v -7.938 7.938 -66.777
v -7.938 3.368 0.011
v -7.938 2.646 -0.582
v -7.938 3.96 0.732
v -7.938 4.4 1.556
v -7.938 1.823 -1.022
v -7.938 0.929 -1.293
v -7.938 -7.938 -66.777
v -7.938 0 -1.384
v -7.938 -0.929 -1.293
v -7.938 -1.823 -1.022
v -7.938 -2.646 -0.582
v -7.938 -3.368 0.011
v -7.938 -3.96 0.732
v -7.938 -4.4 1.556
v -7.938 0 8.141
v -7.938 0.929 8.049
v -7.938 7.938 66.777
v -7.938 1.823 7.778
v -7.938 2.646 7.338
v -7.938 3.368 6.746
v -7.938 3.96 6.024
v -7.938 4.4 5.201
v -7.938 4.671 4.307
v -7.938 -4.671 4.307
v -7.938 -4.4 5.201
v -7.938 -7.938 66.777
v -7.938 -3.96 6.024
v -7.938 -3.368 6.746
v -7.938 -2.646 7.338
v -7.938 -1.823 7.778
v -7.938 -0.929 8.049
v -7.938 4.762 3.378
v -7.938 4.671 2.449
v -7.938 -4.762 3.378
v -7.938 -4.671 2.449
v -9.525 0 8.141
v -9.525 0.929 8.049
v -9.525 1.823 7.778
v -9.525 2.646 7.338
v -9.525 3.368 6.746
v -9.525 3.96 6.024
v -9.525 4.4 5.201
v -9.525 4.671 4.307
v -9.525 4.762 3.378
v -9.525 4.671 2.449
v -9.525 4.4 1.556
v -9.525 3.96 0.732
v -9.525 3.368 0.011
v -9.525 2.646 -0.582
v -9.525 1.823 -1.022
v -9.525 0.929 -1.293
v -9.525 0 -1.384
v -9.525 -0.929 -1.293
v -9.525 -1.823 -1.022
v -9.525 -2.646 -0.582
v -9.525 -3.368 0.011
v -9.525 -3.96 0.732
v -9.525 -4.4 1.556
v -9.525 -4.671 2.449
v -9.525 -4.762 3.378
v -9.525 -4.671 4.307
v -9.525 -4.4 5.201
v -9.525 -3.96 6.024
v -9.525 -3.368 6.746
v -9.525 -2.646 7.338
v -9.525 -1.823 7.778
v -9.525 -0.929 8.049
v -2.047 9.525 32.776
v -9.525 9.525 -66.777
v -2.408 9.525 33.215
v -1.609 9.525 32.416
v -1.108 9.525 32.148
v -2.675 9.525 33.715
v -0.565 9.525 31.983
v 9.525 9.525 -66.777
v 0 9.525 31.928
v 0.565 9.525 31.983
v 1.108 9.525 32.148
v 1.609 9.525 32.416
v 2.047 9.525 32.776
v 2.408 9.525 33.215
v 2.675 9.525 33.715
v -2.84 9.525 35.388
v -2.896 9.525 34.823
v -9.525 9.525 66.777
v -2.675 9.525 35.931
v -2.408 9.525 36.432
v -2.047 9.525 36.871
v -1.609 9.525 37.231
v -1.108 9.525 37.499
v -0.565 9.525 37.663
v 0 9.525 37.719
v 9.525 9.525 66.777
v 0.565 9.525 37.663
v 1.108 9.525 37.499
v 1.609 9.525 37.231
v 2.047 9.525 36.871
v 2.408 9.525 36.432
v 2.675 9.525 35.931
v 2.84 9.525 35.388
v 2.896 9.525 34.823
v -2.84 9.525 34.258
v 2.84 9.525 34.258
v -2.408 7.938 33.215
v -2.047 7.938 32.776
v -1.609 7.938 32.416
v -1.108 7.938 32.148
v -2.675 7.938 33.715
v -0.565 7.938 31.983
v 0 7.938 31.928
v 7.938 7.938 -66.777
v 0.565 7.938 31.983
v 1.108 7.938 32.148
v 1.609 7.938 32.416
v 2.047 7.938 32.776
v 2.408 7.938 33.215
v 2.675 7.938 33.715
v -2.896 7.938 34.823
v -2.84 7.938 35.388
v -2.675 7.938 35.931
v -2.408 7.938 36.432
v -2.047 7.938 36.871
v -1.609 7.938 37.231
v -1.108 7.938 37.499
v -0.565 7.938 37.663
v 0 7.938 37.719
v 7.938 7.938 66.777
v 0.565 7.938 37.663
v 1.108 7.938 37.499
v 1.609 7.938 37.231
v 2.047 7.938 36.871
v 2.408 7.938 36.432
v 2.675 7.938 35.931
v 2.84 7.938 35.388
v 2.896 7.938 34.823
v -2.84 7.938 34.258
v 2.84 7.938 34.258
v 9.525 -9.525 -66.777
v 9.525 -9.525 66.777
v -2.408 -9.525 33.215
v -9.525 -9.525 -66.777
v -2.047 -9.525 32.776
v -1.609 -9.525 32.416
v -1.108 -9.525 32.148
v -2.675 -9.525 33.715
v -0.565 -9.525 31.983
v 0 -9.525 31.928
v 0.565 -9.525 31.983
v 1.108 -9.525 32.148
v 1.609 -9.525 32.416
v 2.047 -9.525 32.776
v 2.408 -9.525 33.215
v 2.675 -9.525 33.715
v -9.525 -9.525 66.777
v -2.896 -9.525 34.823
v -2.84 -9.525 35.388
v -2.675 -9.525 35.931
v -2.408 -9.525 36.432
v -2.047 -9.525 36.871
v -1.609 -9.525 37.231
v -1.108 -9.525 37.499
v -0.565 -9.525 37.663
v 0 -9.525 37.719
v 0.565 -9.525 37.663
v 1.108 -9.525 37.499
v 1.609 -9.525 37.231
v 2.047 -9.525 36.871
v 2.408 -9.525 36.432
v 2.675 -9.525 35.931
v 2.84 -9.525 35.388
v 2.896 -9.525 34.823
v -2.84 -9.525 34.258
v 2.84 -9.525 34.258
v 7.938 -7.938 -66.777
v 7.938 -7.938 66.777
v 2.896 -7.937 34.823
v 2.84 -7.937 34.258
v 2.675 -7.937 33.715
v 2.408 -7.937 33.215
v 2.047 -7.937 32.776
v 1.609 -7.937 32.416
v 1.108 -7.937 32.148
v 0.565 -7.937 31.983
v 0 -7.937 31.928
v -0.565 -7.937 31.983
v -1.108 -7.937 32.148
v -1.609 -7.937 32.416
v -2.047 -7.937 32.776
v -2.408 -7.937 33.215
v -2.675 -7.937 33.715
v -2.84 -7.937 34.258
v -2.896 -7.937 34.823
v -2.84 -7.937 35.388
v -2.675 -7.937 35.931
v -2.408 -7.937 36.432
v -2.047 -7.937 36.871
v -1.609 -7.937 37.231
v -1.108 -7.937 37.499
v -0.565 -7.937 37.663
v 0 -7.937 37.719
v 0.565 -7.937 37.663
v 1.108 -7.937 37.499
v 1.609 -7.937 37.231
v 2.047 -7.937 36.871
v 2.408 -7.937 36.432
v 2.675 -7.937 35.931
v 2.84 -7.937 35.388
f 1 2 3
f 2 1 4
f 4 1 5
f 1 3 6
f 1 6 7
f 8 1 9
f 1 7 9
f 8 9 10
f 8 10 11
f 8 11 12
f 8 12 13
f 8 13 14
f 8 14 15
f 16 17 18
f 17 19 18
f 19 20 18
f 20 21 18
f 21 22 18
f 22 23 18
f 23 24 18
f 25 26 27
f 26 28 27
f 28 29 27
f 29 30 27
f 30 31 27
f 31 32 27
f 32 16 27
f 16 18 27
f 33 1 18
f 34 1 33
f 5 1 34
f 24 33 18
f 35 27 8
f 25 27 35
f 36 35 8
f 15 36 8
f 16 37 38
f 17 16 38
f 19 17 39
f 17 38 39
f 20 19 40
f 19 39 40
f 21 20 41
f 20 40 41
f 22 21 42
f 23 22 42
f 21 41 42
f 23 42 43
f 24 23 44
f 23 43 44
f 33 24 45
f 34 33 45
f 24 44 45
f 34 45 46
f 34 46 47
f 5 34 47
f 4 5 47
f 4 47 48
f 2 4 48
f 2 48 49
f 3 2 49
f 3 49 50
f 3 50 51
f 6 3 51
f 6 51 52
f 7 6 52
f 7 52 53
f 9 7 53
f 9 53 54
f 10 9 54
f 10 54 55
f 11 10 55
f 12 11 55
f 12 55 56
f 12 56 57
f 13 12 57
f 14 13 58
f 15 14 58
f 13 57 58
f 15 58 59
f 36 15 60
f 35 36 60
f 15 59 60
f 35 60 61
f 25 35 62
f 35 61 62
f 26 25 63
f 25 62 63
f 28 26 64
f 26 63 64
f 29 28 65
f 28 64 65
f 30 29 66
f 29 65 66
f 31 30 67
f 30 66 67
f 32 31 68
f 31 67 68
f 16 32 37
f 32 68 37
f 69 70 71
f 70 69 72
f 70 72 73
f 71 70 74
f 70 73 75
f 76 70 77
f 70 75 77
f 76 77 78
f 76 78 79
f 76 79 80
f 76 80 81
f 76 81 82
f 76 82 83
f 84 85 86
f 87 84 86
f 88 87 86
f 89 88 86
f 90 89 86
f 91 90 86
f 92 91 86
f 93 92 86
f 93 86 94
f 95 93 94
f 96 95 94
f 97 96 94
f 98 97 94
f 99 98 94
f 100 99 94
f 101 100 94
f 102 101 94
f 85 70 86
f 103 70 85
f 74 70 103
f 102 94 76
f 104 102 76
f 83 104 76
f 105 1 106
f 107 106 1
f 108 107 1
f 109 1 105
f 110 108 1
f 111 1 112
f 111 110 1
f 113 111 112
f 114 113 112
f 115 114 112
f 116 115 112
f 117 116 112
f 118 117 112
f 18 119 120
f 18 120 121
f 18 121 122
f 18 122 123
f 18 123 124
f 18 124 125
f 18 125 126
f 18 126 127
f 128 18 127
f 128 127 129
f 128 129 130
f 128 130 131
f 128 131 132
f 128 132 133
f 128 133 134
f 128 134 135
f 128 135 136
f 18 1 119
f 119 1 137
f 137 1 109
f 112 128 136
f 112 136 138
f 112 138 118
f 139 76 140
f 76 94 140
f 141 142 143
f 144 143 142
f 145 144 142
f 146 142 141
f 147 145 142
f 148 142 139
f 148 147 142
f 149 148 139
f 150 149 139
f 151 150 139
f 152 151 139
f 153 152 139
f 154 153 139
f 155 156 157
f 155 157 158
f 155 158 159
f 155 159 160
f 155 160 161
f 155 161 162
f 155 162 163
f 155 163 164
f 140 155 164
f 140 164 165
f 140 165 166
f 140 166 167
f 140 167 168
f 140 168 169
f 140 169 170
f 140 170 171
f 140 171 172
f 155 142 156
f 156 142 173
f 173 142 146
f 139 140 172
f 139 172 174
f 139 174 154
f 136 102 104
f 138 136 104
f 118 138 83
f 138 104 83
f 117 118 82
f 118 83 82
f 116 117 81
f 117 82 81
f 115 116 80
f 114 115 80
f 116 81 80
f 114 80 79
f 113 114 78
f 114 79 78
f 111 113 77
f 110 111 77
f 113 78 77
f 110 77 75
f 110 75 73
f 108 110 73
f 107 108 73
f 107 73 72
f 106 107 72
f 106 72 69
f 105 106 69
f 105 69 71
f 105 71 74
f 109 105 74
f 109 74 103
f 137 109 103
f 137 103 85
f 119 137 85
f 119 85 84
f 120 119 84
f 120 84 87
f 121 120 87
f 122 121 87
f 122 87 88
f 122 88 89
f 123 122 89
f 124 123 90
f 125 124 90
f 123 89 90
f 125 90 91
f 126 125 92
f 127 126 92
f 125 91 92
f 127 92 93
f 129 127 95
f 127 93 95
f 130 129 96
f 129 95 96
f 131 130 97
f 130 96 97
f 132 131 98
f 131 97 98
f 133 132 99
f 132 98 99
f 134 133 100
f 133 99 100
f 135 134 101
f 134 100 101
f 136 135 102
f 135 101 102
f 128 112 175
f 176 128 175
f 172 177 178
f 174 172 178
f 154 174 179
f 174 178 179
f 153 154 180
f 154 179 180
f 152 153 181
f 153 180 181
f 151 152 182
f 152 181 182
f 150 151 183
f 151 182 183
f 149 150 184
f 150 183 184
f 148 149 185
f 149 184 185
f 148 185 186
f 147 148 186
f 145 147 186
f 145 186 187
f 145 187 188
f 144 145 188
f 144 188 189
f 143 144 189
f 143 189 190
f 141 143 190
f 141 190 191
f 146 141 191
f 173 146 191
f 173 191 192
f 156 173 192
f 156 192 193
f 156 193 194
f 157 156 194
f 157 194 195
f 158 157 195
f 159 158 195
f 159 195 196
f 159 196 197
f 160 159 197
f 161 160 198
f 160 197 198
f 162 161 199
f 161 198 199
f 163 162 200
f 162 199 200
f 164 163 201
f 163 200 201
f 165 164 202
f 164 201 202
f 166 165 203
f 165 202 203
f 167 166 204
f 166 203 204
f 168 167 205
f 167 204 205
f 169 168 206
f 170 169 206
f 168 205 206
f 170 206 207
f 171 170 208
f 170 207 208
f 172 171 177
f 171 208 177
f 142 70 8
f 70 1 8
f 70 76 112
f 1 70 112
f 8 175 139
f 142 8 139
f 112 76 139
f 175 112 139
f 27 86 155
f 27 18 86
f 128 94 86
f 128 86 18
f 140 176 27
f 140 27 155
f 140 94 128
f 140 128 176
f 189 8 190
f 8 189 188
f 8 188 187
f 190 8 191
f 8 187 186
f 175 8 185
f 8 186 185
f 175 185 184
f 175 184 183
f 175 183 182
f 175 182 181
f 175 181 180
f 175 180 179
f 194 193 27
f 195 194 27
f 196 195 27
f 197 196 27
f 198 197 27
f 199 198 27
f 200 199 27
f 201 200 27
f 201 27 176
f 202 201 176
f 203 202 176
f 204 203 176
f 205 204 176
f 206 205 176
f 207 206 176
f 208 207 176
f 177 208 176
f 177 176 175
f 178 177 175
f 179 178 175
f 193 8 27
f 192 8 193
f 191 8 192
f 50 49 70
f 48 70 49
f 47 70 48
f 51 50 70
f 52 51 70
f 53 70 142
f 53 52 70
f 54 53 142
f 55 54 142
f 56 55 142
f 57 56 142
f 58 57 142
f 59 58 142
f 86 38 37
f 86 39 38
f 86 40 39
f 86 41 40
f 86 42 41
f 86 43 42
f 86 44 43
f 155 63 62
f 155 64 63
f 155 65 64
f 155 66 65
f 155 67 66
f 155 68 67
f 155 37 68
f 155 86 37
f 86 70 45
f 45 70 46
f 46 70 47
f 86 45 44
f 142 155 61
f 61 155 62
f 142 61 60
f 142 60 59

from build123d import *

# Parameters (mm, degrees)
SKETCH1_W                = 19.05
SKETCH1_H                = 19.05
SKETCH1_W_2              = 15.875
SKETCH1_H_2              = 15.875
BOSS_EXTRUDE1_DEPTH      = 66.7766
SKETCH2_R                = 2.8956
BASEPLATEMOUNTHOLE_DEPTH = 20.05
CUT_EXTRUDE1_REACH       = 21.05
SKETCH3_R                = 4.7625


with BuildPart() as part:
    # Sketch1 → Boss-Extrude1 (new body, symmetric)
    with BuildSketch(Plane(origin=(0, 0, 0), x_dir=(0, -1, 0), z_dir=(0, 0, 1))):
        Rectangle(SKETCH1_W, SKETCH1_H)
        Rectangle(SKETCH1_W_2, SKETCH1_H_2, mode=Mode.SUBTRACT)
    extrude(amount=BOSS_EXTRUDE1_DEPTH, both=True)

    # Sketch2 → BasePlateMountHole (cut, through all)
    with BuildSketch(Plane(origin=(0, 9.525, 0), x_dir=(1, 0, 0), z_dir=(0, 1, 0))):
        with Locations((0, -34.8234)):
            Circle(SKETCH2_R)
    extrude(amount=-BASEPLATEMOUNTHOLE_DEPTH, mode=Mode.SUBTRACT)

    # Sketch3 → Cut-Extrude1 (cut, up to next)
    with BuildSketch(Plane.ZY.offset(9.525), mode=Mode.PRIVATE) as cut_extrude1_sk1:
        with Locations((3.3782, 0)):
            Circle(SKETCH3_R)
    cut_extrude1_tool1 = extrude(cut_extrude1_sk1.sketch, amount=-CUT_EXTRUDE1_REACH, mode=Mode.PRIVATE) & part.part
    add(cut_extrude1_tool1.solids().sort_by_distance((-9.525, 0, 3.3782))[0], mode=Mode.SUBTRACT)


solid = part.part
